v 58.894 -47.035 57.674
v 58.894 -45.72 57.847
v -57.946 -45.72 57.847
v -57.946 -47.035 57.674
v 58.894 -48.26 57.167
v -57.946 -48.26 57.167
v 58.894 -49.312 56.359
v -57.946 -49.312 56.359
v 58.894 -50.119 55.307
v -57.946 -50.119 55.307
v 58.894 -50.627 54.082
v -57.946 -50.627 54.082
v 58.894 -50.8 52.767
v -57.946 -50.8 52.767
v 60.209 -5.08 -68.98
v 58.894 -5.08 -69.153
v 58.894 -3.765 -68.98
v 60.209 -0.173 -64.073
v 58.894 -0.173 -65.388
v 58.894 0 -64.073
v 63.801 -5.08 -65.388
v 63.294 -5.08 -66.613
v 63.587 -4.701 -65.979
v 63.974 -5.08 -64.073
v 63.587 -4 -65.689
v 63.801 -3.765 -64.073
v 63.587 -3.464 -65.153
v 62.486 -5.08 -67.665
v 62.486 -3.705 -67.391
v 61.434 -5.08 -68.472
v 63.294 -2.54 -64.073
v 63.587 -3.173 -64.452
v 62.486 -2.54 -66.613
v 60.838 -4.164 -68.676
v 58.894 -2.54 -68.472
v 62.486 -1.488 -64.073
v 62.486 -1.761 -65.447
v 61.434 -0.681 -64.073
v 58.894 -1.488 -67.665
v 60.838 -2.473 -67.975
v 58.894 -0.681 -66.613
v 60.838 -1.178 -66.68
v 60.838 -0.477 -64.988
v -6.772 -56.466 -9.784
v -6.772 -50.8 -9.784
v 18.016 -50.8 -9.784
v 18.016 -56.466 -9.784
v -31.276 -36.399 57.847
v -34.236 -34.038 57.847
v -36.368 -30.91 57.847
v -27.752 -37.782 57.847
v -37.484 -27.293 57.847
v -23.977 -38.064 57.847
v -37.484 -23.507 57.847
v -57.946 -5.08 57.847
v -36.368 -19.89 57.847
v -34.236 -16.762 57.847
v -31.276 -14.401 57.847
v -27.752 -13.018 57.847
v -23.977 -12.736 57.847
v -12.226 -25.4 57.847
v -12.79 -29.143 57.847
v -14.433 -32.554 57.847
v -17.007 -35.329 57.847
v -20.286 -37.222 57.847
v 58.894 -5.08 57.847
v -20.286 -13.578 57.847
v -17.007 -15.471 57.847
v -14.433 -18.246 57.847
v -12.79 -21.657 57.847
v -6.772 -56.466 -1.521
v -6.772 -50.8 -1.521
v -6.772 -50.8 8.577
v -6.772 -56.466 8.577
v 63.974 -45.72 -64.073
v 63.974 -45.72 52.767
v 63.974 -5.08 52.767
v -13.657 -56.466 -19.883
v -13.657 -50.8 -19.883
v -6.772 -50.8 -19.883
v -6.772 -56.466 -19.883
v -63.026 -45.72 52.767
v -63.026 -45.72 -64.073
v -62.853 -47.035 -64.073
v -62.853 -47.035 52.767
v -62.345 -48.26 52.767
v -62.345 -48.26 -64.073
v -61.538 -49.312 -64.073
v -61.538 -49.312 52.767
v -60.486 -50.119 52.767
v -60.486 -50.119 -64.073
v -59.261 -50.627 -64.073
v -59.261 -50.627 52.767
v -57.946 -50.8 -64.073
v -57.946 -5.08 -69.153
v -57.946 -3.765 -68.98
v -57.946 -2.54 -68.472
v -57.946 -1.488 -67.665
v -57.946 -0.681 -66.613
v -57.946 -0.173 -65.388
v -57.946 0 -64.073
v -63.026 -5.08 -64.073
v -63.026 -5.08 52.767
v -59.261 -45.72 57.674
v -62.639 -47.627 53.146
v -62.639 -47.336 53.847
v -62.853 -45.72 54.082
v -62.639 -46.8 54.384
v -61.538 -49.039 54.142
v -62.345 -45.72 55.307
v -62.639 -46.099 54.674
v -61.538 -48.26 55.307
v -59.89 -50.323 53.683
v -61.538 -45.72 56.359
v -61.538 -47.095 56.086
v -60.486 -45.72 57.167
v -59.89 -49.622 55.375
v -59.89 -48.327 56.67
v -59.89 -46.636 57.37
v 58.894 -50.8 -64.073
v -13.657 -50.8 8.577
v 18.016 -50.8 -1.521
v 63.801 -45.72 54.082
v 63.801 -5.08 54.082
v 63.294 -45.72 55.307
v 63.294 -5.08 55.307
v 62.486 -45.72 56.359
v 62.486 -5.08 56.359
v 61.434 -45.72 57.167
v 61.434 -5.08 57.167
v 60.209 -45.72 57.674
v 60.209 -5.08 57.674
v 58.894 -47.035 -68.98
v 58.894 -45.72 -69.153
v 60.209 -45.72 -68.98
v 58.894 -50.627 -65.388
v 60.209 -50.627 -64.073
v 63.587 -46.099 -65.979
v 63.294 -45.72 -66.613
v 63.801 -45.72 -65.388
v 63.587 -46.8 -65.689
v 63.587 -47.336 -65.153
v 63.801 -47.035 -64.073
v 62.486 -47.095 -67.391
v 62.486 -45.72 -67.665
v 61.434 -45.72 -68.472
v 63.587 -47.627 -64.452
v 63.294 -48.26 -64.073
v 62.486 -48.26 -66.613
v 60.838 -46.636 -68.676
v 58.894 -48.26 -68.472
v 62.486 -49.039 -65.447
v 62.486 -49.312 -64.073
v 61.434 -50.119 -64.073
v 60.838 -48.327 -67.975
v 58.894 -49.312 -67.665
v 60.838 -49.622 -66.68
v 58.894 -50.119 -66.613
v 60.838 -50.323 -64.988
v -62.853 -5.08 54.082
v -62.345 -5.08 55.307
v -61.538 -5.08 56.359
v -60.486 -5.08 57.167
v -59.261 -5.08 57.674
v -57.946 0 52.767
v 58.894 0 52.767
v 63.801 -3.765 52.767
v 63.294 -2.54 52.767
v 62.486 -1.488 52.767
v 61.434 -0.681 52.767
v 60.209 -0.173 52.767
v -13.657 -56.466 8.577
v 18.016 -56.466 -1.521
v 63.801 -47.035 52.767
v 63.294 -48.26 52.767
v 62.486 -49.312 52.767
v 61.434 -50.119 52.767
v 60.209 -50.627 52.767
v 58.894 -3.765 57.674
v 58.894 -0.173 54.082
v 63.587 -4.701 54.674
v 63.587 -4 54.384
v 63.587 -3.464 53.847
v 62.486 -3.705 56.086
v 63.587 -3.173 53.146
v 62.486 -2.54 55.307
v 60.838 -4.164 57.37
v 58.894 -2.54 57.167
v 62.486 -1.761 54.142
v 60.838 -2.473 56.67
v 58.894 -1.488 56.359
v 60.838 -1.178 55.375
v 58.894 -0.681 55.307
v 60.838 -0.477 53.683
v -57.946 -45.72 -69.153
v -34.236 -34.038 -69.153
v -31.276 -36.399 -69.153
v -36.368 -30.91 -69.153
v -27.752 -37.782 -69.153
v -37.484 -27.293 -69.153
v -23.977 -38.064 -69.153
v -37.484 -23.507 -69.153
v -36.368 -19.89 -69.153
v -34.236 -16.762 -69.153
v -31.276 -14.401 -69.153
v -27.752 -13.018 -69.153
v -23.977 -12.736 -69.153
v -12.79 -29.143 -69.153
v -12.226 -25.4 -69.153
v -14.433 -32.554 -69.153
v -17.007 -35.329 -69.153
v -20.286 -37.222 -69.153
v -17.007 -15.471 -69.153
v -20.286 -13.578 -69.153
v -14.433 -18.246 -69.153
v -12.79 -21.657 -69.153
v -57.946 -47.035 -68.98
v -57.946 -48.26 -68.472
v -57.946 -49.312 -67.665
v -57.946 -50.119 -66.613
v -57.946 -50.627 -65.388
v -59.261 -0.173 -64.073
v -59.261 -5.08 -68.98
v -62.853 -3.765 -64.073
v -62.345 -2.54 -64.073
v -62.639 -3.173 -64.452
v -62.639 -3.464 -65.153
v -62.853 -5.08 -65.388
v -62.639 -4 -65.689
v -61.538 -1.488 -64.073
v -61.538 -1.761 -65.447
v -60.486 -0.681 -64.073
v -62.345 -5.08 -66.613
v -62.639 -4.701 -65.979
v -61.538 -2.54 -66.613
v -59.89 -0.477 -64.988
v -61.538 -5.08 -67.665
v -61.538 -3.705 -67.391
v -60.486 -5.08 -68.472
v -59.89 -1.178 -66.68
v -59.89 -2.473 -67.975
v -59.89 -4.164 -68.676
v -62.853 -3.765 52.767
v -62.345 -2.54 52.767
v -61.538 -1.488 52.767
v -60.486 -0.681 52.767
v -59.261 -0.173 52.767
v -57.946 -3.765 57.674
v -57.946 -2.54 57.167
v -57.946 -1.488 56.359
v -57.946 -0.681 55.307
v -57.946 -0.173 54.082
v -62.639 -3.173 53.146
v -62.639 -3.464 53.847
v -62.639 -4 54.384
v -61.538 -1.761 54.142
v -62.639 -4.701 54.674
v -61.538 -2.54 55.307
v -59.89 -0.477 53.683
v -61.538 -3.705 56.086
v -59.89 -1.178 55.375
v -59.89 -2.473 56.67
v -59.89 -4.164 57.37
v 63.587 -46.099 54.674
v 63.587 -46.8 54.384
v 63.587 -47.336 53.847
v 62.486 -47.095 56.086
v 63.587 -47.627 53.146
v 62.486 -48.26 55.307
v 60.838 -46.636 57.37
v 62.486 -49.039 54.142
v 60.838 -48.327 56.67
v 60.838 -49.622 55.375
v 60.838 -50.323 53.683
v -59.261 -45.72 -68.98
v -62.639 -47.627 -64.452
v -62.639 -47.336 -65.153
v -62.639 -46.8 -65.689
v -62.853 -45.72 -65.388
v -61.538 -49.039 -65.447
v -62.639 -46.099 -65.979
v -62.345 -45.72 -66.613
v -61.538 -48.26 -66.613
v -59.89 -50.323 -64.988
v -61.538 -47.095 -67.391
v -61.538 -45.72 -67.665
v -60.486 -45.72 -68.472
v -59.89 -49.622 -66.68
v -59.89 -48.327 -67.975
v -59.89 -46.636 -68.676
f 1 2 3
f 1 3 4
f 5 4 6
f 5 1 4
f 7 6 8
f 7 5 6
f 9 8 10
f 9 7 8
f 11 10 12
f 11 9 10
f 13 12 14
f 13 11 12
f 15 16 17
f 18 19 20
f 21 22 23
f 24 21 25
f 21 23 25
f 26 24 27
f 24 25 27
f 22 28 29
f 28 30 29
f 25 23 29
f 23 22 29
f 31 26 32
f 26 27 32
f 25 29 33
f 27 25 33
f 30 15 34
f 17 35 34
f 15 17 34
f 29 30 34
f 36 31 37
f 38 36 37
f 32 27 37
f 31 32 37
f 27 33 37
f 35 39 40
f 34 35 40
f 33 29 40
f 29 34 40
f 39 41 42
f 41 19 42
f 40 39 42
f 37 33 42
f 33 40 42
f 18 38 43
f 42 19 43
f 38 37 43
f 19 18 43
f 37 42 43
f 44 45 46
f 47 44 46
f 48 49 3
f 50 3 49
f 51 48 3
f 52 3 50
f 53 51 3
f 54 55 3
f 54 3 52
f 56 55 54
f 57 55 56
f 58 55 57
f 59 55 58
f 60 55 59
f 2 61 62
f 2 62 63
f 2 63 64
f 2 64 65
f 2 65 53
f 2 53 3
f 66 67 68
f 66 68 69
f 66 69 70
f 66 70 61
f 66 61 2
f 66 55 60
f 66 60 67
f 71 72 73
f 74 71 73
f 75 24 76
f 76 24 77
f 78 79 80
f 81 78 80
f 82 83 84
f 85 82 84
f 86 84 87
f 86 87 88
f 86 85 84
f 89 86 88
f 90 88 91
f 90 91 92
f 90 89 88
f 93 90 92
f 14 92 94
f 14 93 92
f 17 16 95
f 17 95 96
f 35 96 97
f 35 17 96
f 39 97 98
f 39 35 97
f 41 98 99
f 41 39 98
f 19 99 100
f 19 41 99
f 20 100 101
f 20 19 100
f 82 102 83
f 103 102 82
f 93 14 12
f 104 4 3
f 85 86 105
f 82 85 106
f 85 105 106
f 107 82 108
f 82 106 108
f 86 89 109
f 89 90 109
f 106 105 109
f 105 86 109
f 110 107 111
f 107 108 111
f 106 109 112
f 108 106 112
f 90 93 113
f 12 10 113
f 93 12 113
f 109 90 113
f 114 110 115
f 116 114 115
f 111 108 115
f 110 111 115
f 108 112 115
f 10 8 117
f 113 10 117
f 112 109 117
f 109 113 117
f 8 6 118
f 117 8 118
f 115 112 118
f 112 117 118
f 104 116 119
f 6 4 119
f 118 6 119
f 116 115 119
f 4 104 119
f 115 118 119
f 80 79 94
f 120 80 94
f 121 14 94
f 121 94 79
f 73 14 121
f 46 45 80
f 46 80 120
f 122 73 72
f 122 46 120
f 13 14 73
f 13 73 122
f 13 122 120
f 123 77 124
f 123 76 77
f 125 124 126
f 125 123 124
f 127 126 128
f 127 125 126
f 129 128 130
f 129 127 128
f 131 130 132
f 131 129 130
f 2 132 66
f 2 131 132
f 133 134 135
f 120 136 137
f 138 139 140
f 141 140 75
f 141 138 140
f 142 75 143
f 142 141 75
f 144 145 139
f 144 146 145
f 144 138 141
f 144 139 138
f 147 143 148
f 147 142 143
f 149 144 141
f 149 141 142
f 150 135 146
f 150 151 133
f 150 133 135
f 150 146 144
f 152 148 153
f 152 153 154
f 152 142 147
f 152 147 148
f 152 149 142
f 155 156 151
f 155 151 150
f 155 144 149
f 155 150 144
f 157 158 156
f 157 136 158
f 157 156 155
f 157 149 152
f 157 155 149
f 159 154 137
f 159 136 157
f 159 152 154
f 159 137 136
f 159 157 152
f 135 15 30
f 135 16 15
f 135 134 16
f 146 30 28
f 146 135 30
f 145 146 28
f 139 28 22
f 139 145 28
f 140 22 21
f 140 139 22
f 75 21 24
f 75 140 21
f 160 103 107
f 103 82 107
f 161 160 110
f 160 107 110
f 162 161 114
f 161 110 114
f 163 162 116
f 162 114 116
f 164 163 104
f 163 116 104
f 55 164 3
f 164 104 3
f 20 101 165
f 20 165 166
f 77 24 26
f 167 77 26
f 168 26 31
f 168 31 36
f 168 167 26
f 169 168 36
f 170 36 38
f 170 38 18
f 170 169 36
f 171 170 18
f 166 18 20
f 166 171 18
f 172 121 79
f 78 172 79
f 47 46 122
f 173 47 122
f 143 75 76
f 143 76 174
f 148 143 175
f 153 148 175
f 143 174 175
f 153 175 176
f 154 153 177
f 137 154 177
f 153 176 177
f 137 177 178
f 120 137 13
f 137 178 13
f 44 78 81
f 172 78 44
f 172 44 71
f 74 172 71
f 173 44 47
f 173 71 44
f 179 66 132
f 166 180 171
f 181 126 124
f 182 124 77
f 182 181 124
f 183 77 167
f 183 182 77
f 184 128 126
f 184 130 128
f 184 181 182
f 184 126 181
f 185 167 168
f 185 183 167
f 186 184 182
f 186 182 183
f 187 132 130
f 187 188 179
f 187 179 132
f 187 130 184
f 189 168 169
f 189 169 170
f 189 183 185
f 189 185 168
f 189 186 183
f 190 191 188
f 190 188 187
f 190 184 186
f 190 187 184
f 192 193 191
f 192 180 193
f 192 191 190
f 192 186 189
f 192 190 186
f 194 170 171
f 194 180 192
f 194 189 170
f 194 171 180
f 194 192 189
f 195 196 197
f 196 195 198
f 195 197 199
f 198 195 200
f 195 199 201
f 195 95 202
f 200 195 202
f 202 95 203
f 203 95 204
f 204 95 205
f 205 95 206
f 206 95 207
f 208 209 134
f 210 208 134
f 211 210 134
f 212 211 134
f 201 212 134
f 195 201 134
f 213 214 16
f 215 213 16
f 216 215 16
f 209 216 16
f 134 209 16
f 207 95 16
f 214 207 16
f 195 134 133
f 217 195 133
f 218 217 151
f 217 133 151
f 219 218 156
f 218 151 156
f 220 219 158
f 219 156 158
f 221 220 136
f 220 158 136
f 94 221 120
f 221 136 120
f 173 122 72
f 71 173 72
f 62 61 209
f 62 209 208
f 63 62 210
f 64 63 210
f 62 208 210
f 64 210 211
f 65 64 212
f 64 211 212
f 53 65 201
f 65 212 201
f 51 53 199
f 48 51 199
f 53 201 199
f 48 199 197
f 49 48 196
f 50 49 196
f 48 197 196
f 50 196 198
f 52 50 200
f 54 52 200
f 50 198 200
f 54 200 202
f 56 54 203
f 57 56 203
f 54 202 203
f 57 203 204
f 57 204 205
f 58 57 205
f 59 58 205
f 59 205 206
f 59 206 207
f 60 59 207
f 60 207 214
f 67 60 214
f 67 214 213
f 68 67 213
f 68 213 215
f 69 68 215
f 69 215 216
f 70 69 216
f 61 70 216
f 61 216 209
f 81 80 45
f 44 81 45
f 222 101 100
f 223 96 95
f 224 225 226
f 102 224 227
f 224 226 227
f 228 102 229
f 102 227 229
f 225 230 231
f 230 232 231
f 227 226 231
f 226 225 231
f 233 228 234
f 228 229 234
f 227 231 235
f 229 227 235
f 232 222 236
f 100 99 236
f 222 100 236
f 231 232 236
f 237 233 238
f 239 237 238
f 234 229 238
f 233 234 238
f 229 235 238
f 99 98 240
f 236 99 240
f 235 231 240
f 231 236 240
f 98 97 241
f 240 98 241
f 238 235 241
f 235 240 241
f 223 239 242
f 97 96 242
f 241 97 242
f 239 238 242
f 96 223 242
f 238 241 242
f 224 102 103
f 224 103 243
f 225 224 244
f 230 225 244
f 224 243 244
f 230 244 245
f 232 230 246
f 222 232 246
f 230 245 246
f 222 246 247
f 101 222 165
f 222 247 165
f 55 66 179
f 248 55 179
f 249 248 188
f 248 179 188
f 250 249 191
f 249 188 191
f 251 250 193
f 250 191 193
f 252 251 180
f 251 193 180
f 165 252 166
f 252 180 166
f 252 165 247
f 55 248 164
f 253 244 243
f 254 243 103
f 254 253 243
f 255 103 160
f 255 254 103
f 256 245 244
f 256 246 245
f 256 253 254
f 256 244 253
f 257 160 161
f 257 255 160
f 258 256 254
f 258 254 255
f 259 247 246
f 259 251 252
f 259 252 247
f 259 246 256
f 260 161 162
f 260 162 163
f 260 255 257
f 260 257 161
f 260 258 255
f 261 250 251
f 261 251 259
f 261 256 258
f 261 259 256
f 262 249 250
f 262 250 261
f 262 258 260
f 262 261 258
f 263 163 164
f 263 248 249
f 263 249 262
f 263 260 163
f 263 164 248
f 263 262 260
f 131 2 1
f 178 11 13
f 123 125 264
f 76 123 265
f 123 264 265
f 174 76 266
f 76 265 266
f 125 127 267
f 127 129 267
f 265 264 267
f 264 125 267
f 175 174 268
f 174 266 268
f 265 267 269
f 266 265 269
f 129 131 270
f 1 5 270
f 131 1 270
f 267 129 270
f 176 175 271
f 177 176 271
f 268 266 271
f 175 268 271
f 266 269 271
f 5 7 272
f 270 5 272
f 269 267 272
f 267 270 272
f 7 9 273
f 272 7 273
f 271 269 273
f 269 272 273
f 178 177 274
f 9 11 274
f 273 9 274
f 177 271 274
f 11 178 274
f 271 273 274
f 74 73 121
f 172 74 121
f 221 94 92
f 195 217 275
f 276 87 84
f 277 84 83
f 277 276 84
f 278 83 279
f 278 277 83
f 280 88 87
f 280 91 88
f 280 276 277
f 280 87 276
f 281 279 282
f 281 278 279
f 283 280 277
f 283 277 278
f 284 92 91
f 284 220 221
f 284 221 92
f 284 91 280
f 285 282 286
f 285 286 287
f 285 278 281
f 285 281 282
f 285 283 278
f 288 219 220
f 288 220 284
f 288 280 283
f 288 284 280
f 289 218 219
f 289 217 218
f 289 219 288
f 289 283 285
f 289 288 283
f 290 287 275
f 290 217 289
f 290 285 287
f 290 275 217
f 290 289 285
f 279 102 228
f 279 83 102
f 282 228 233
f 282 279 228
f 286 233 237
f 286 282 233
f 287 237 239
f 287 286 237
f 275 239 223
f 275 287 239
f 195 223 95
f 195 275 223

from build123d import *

# Parameters (mm, degrees)
F0_W     = 127
F0_H     = 127
F1_DEPTH = 50.8
F2_R     = 5.08
F4_DEPTH = 5.66607
F6_DEPTH = 127.001


with BuildPart() as f1:
    # F0 (on Front) → F1 (new body)
    with BuildSketch(Plane.XZ):
        with Locations((0.4741810262, -5.6527711832)):
            Rectangle(F0_W, F0_H)
    extrude(amount=F1_DEPTH)

    # F2
    f2_edges = [f1.edges().sort_by_distance(p)[0] for p in [
        (0.474181, -50.8, -69.152771),
        (0.474181, 0, -69.152771),
        (0.474181, 0, 57.847229),
        (0.474181, -50.8, 57.847229),
        (-63.025819, -50.8, -5.652771),
        (-63.025819, 0, -5.652771),
        (-63.025819, -25.4, 57.847229),
        (-63.025819, -25.4, -69.152771),
        (63.974181, -25.4, -69.152771),
        (63.974181, -25.4, 57.847229),
        (63.974181, 0, -5.652771),
        (63.974181, -50.8, -5.652771),
    ]]
    fillet(f2_edges, radius=F2_R)

    # F3 (on face) → F4 (join)
    with BuildSketch(Plane.XZ.offset(50.8)):
        Polygon((-13.6571113464, 8.5772094634), (-13.6571113464, -19.8827518299), (-6.7716367987, -19.8827518299), (-6.7716367987, -9.7840579375), (18.0160704556, -9.7840579375), (18.0160704556, -1.521484429), (-6.7716367987, -1.521484429), (-6.7716367987, 8.5772094634), align=None)
    extrude(amount=F4_DEPTH)

    # F5 (on face) → F6 (cut, through all)
    with BuildSketch(Plane(origin=(0, 0, -69.1527711832), x_dir=(1, 0, 0), z_dir=(0, 0, -1))):
        with BuildLine():
            ThreePointArc((-37.6258189738, 25.4), (-24.9258189738, 12.7), (-12.2258189738, 25.4))
            ThreePointArc((-12.2258189738, 25.4), (-24.9258189738, 38.1), (-37.6258189738, 25.4))
        make_face()
    extrude(amount=-F6_DEPTH, mode=Mode.SUBTRACT)


solid = f1.part
